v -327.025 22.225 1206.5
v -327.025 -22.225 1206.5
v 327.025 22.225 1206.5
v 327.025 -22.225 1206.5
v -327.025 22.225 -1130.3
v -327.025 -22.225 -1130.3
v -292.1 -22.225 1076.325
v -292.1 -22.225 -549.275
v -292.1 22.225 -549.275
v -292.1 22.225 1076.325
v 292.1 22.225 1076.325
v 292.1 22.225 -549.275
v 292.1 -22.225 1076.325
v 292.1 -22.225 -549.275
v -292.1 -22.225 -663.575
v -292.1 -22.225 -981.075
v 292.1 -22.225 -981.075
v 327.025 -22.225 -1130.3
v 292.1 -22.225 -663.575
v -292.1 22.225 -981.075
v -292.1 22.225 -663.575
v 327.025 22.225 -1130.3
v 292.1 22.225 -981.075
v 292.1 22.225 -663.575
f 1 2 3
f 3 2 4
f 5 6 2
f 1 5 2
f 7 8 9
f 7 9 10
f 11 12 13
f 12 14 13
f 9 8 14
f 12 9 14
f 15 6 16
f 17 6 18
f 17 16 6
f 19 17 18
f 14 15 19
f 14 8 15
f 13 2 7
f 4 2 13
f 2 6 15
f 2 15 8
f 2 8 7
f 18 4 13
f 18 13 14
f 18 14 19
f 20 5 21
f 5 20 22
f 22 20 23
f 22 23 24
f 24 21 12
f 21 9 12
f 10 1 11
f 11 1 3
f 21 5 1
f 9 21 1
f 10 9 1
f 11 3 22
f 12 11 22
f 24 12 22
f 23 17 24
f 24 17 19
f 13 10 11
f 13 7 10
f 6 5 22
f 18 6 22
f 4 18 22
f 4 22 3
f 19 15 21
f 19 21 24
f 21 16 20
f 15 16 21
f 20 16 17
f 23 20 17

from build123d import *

# Parameters (mm, degrees)
F0_W          = 654.05
F0_H          = 2413
F0_W_2        = 584.2
F0_H_2        = 317.5
F0_H_3        = 1625.6
F1_DEPTH      = 22.225
F1_DEPTH_BACK = 22.225
F2_W          = 1248.5843106929
F2_H          = 271.0993243682
F2_H_2        = 504.0157202398
F3_DEPTH      = 22.226
F3_DEPTH_BACK = 22.226


# Not quite as in the source:
# - a length typed as a fraction of an inch, garbled in the dataset ("3 / 203.2 mm" for 3/8 in), is restored


with BuildPart() as f1:
    # F0 (on Front) → F1 (new body, two sides)
    with BuildSketch(Plane.XZ) as f1_sk:
        Rectangle(F0_W, F0_H)
        with Locations((0, -822.325)):
            Rectangle(F0_W_2, F0_H_2, mode=Mode.SUBTRACT)
        with Locations((0, 263.525)):
            Rectangle(F0_W_2, F0_H_3, mode=Mode.SUBTRACT)
    extrude(amount=F1_DEPTH)
    extrude(f1_sk.sketch, amount=-F1_DEPTH_BACK)

    # F2 (on Front) → F3 (cut, two sides)
    with BuildSketch(Plane.XZ) as f3_sk:
        with Locations((62.8663003445, 1342.0496621841)):
            Rectangle(F2_W, F2_H)
        with Locations((62.8663003445, -1382.3078601199)):
            Rectangle(F2_W, F2_H_2)
    extrude(amount=-F3_DEPTH, mode=Mode.SUBTRACT)
    extrude(f3_sk.sketch, amount=F3_DEPTH_BACK, mode=Mode.SUBTRACT)


solid = f1.part
